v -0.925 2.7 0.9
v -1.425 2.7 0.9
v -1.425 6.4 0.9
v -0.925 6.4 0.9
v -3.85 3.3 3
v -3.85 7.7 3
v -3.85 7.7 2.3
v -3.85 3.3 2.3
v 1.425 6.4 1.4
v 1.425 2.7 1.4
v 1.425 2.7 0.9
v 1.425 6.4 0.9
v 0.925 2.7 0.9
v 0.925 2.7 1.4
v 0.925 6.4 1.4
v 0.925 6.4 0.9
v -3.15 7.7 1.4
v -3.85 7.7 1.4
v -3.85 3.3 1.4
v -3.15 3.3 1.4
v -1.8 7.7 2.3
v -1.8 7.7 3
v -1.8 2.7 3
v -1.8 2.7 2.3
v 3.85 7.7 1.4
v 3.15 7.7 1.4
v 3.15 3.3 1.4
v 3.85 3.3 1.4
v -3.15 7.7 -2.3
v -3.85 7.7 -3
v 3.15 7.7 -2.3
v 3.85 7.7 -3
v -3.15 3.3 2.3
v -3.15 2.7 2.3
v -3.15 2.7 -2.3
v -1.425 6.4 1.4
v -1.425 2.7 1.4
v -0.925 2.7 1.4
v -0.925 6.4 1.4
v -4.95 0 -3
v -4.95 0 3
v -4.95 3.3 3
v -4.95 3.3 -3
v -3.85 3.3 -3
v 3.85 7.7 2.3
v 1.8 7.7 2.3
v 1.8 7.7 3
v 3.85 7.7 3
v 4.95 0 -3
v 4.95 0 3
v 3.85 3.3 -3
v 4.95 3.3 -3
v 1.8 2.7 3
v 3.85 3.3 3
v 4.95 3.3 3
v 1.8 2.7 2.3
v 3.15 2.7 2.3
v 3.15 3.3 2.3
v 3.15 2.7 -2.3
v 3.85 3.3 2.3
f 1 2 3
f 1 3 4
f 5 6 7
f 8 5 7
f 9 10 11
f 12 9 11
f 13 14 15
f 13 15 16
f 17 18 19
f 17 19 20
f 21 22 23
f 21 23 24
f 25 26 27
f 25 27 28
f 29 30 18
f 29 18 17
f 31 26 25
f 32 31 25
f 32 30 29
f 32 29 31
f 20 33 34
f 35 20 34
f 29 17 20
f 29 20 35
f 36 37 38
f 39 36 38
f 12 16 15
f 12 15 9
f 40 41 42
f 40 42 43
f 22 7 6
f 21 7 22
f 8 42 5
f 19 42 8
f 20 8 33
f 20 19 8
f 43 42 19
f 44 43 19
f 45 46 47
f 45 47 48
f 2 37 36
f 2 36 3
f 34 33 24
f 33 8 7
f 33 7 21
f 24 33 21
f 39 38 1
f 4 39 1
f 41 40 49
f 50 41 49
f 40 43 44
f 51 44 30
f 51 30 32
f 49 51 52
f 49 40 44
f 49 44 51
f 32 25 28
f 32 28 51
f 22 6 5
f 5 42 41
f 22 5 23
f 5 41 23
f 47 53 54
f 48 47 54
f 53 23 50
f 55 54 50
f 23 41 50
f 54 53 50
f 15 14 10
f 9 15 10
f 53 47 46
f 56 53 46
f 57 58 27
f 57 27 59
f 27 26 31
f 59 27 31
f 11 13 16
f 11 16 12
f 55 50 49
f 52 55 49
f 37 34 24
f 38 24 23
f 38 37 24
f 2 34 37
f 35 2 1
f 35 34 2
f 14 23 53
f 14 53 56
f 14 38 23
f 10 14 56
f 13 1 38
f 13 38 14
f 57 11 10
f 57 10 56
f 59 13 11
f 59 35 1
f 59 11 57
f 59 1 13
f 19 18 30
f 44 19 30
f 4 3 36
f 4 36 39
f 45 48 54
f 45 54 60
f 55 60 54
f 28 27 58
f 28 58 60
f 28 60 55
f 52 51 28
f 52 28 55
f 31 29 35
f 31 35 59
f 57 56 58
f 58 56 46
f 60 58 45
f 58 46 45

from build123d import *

# Parameters (mm, degrees)
SKETCH1_W           = 9.9
SKETCH1_H           = 6
BOSS_EXTRUDE1_DEPTH = 7.7
SKETCH2_W           = 6.3
SKETCH2_H           = 4.6
CUT_EXTRUDE1_DEPTH  = 5
SKETCH3_W           = 1.1
SKETCH3_H           = 6
CUT_EXTRUDE2_DEPTH  = 4.4
SKETCH4_W           = 3.6
SKETCH4_H           = 0.7
CUT_EXTRUDE3_DEPTH  = 5
SKETCH5_W           = 7.7
SKETCH5_H           = 0.9
CUT_EXTRUDE4_DEPTH  = 4.4
SKETCH6_W           = 0.5
SKETCH6_H           = 0.5
BOSS_EXTRUDE2_DEPTH = 3.7


with BuildPart() as part:
    # Sketch1 → Boss-Extrude1 (new body)
    with BuildSketch(Plane(origin=(0, 0, 0), x_dir=(1, 0, 0), z_dir=(0, 1, 0))):
        Rectangle(SKETCH1_W, SKETCH1_H)
    extrude(amount=BOSS_EXTRUDE1_DEPTH)

    # Sketch2 → Cut-Extrude1 (cut)
    with BuildSketch(Plane(origin=(0, 7.7, 0), x_dir=(1, 0, 0), z_dir=(0, 1, 0))):
        Rectangle(SKETCH2_W, SKETCH2_H)
    extrude(amount=-CUT_EXTRUDE1_DEPTH, mode=Mode.SUBTRACT)

    # Sketch3 → Cut-Extrude2 (cut)
    with BuildSketch(Plane(origin=(0, 7.7, 0), x_dir=(1, 0, 0), z_dir=(0, 1, 0))):
        with Locations((-4.4, 0)):
            Rectangle(SKETCH3_W, SKETCH3_H)
        with Locations((4.4, 0)):
            Rectangle(SKETCH3_W, SKETCH3_H)
    extrude(amount=-CUT_EXTRUDE2_DEPTH, mode=Mode.SUBTRACT)

    # Sketch4 → Cut-Extrude3 (cut)
    with BuildSketch(Plane(origin=(0, 7.7, 0), x_dir=(1, 0, 0), z_dir=(0, 1, 0))):
        with Locations((0, -2.65)):
            Rectangle(SKETCH4_W, SKETCH4_H)
    extrude(amount=-CUT_EXTRUDE3_DEPTH, mode=Mode.SUBTRACT)

    # Sketch5 → Cut-Extrude4 (cut)
    with BuildSketch(Plane(origin=(0, 7.7, 0), x_dir=(1, 0, 0), z_dir=(0, 1, 0))):
        with Locations((0, -1.85)):
            Rectangle(SKETCH5_W, SKETCH5_H)
    extrude(amount=-CUT_EXTRUDE4_DEPTH, mode=Mode.SUBTRACT)

    # Sketch6 → Boss-Extrude2 (add)
    with BuildSketch(Plane(origin=(0, 2.7, 0), x_dir=(1, 0, 0), z_dir=(0, 1, 0))):
        with Locations((-1.175, -1.15)):
            Rectangle(SKETCH6_W, SKETCH6_H)
        with Locations((1.175, -1.15)):
            Rectangle(SKETCH6_W, SKETCH6_H)
    extrude(amount=BOSS_EXTRUDE2_DEPTH)


solid = part.part
